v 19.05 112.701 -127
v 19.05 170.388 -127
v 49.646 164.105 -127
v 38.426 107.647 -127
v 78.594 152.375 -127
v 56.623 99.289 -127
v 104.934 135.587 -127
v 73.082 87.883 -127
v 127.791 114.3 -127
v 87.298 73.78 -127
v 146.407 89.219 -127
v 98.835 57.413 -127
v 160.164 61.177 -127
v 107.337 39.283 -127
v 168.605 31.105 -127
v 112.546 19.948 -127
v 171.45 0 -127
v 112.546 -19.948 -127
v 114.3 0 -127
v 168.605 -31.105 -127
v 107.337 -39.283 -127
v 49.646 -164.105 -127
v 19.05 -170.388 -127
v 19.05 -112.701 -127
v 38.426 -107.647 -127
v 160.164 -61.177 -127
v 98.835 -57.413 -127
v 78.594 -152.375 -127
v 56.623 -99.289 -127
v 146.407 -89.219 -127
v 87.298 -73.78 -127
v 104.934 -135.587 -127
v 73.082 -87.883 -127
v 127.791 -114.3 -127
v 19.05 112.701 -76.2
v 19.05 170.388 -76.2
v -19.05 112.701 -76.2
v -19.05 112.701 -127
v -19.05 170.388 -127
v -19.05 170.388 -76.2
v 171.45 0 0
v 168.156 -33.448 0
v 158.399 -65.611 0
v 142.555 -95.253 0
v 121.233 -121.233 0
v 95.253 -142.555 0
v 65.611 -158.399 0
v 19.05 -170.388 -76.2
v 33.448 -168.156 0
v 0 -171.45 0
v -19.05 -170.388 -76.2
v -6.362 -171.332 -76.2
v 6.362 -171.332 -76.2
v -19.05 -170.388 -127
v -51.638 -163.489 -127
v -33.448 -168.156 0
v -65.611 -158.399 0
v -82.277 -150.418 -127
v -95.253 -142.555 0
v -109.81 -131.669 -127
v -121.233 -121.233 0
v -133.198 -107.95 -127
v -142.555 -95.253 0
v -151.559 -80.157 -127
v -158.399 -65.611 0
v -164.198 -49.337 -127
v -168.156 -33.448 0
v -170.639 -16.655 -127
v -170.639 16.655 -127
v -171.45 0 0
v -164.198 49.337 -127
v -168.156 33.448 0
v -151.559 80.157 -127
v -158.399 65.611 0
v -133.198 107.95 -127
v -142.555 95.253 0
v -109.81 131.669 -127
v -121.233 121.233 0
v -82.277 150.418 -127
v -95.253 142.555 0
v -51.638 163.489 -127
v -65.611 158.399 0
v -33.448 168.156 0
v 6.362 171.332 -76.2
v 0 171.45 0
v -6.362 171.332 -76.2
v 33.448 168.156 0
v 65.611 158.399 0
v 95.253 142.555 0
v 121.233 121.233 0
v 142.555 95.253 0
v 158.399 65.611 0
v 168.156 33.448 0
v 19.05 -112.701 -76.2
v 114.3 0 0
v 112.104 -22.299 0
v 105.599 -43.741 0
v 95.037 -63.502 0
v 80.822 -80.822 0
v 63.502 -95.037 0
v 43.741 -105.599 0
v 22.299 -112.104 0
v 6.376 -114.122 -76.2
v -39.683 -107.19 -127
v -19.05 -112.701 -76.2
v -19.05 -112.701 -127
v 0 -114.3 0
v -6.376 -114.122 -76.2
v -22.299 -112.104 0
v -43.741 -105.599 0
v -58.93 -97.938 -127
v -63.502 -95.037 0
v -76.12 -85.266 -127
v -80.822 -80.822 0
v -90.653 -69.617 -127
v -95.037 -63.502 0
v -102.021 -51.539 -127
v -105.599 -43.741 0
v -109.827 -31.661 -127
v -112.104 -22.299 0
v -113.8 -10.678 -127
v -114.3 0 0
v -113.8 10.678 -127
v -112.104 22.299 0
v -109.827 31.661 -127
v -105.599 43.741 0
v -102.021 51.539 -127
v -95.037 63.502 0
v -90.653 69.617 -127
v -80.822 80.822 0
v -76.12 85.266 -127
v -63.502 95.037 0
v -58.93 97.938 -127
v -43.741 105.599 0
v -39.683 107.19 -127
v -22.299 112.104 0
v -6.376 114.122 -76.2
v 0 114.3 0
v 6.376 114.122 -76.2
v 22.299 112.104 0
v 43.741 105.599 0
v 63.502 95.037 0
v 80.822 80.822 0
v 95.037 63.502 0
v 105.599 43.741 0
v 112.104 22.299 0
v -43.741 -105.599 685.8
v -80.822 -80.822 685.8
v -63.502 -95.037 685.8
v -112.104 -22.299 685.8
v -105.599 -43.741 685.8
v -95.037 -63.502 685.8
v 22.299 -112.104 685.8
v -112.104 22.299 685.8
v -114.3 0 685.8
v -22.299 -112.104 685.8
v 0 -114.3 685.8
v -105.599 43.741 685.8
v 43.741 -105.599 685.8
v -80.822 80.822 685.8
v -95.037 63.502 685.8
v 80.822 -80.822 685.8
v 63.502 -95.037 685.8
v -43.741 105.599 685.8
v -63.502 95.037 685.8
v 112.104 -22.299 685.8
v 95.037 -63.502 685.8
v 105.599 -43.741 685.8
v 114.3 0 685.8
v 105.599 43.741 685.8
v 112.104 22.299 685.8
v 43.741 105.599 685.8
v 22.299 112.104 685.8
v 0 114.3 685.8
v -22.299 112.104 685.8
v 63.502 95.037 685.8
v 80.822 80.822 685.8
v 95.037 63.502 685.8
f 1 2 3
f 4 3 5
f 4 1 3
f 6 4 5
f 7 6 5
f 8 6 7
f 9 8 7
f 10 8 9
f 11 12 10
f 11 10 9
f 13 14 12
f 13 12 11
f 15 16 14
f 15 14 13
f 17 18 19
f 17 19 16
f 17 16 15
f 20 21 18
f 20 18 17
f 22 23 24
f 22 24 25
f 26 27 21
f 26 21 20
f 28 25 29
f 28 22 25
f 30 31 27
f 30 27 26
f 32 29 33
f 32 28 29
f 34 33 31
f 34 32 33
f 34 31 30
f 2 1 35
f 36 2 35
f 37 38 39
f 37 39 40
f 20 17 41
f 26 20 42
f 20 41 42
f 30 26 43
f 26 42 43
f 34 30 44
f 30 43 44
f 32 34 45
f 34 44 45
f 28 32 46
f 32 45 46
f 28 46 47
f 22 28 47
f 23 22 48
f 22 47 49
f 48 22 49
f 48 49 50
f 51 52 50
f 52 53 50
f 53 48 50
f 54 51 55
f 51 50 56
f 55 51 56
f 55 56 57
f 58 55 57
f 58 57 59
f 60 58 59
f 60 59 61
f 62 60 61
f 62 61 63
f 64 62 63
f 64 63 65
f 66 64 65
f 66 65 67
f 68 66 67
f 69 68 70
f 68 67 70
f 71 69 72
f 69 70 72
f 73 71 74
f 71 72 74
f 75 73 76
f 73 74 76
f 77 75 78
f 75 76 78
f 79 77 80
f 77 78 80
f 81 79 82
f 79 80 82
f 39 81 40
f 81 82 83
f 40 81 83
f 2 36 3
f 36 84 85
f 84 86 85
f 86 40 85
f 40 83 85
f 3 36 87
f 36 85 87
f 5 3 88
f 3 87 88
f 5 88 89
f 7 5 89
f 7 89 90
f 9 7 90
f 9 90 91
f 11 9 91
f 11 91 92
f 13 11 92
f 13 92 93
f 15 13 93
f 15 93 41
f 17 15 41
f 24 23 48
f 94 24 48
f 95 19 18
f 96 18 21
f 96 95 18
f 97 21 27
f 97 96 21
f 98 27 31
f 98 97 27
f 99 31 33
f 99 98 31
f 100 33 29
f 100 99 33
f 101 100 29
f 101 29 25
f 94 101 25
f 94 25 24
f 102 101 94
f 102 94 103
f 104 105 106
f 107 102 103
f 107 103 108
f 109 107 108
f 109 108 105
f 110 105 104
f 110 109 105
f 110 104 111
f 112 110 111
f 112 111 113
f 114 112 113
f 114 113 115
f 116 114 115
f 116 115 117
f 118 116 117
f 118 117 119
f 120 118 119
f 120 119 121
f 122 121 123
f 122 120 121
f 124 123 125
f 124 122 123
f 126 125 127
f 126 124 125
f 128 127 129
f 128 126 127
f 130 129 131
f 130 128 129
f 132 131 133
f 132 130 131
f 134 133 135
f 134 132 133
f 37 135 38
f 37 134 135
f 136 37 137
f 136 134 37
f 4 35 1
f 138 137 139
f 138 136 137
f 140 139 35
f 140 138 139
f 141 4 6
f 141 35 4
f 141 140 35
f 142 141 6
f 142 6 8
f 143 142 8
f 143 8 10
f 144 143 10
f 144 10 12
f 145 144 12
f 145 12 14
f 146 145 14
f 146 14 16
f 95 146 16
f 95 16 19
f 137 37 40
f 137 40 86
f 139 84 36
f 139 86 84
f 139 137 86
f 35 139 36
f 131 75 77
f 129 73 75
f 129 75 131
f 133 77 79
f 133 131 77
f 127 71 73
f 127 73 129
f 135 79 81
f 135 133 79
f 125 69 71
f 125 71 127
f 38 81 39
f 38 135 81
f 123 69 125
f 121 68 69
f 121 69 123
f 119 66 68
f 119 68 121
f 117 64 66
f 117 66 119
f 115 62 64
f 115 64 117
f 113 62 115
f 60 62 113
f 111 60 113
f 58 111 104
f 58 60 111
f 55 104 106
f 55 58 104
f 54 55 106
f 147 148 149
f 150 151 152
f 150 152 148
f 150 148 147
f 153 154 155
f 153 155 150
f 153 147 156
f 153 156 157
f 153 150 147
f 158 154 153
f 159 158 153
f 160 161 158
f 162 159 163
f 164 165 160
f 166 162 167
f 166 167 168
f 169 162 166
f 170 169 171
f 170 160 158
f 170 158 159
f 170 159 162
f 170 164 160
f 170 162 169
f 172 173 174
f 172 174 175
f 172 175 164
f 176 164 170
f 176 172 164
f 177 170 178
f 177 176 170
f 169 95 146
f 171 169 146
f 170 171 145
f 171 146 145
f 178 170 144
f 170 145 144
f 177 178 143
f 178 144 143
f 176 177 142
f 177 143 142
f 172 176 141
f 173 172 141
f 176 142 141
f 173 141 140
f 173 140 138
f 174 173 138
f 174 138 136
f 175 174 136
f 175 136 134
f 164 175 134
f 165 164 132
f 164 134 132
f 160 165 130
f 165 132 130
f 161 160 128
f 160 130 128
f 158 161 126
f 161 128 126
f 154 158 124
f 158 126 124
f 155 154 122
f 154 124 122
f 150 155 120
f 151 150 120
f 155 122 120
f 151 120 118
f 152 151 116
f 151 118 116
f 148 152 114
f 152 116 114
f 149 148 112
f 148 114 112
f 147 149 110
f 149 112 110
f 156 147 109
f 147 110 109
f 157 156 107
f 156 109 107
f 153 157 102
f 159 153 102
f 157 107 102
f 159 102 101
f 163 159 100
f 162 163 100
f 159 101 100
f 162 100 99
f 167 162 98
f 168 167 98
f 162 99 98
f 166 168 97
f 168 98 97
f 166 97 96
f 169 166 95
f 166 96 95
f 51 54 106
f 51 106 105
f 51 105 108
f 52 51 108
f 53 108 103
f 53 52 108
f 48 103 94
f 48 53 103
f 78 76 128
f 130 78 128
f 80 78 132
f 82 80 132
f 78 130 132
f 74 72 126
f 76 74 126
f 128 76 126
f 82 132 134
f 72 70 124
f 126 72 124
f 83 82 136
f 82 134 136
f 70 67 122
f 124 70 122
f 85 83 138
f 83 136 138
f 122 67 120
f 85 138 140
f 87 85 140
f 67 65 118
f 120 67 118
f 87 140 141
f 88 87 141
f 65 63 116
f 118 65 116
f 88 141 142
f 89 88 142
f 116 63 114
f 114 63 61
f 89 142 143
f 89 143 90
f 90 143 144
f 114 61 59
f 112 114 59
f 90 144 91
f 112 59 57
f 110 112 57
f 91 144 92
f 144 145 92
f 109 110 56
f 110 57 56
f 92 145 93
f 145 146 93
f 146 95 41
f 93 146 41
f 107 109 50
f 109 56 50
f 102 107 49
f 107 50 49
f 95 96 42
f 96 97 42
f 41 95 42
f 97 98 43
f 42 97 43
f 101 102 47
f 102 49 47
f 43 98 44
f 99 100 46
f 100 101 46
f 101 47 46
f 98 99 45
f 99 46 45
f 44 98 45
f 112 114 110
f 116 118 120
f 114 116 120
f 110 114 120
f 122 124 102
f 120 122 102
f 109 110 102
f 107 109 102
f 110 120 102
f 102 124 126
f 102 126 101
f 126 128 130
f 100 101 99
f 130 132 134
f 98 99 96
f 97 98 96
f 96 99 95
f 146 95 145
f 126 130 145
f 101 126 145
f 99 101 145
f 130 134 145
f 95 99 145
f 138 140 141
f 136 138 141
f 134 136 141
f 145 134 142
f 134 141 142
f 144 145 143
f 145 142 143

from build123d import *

# Parameters (mm, degrees)
F0_R     = 114.3
F1_DEPTH = 685.8
F2_R     = 171.45
F2_R_2   = 114.3
F3_DEPTH = 127
F4_W     = 38.1
F4_H     = 50.8
F5_DEPTH = 226.06


with BuildPart() as f1:
    # F0 (on Top) → F1 (new body)
    with BuildSketch(Plane.XY):
        Circle(F0_R)
    extrude(amount=F1_DEPTH)


with BuildPart() as f3:
    # F2 (on face) → F3 (new body)
    with BuildSketch(Plane(origin=(0, 0, 0), x_dir=(1, 0, 0), z_dir=(0, 0, -1))):
        Circle(F2_R)
        Circle(F2_R_2, mode=Mode.SUBTRACT)
    extrude(amount=F3_DEPTH)

    # F4 (on Front) → F5 (cut, symmetric)
    with BuildSketch(Plane.XZ):
        with Locations((0, -101.6)):
            Rectangle(F4_W, F4_H)
    extrude(amount=F5_DEPTH, both=True, mode=Mode.SUBTRACT)


solid = Compound([f1.part, f3.part])
